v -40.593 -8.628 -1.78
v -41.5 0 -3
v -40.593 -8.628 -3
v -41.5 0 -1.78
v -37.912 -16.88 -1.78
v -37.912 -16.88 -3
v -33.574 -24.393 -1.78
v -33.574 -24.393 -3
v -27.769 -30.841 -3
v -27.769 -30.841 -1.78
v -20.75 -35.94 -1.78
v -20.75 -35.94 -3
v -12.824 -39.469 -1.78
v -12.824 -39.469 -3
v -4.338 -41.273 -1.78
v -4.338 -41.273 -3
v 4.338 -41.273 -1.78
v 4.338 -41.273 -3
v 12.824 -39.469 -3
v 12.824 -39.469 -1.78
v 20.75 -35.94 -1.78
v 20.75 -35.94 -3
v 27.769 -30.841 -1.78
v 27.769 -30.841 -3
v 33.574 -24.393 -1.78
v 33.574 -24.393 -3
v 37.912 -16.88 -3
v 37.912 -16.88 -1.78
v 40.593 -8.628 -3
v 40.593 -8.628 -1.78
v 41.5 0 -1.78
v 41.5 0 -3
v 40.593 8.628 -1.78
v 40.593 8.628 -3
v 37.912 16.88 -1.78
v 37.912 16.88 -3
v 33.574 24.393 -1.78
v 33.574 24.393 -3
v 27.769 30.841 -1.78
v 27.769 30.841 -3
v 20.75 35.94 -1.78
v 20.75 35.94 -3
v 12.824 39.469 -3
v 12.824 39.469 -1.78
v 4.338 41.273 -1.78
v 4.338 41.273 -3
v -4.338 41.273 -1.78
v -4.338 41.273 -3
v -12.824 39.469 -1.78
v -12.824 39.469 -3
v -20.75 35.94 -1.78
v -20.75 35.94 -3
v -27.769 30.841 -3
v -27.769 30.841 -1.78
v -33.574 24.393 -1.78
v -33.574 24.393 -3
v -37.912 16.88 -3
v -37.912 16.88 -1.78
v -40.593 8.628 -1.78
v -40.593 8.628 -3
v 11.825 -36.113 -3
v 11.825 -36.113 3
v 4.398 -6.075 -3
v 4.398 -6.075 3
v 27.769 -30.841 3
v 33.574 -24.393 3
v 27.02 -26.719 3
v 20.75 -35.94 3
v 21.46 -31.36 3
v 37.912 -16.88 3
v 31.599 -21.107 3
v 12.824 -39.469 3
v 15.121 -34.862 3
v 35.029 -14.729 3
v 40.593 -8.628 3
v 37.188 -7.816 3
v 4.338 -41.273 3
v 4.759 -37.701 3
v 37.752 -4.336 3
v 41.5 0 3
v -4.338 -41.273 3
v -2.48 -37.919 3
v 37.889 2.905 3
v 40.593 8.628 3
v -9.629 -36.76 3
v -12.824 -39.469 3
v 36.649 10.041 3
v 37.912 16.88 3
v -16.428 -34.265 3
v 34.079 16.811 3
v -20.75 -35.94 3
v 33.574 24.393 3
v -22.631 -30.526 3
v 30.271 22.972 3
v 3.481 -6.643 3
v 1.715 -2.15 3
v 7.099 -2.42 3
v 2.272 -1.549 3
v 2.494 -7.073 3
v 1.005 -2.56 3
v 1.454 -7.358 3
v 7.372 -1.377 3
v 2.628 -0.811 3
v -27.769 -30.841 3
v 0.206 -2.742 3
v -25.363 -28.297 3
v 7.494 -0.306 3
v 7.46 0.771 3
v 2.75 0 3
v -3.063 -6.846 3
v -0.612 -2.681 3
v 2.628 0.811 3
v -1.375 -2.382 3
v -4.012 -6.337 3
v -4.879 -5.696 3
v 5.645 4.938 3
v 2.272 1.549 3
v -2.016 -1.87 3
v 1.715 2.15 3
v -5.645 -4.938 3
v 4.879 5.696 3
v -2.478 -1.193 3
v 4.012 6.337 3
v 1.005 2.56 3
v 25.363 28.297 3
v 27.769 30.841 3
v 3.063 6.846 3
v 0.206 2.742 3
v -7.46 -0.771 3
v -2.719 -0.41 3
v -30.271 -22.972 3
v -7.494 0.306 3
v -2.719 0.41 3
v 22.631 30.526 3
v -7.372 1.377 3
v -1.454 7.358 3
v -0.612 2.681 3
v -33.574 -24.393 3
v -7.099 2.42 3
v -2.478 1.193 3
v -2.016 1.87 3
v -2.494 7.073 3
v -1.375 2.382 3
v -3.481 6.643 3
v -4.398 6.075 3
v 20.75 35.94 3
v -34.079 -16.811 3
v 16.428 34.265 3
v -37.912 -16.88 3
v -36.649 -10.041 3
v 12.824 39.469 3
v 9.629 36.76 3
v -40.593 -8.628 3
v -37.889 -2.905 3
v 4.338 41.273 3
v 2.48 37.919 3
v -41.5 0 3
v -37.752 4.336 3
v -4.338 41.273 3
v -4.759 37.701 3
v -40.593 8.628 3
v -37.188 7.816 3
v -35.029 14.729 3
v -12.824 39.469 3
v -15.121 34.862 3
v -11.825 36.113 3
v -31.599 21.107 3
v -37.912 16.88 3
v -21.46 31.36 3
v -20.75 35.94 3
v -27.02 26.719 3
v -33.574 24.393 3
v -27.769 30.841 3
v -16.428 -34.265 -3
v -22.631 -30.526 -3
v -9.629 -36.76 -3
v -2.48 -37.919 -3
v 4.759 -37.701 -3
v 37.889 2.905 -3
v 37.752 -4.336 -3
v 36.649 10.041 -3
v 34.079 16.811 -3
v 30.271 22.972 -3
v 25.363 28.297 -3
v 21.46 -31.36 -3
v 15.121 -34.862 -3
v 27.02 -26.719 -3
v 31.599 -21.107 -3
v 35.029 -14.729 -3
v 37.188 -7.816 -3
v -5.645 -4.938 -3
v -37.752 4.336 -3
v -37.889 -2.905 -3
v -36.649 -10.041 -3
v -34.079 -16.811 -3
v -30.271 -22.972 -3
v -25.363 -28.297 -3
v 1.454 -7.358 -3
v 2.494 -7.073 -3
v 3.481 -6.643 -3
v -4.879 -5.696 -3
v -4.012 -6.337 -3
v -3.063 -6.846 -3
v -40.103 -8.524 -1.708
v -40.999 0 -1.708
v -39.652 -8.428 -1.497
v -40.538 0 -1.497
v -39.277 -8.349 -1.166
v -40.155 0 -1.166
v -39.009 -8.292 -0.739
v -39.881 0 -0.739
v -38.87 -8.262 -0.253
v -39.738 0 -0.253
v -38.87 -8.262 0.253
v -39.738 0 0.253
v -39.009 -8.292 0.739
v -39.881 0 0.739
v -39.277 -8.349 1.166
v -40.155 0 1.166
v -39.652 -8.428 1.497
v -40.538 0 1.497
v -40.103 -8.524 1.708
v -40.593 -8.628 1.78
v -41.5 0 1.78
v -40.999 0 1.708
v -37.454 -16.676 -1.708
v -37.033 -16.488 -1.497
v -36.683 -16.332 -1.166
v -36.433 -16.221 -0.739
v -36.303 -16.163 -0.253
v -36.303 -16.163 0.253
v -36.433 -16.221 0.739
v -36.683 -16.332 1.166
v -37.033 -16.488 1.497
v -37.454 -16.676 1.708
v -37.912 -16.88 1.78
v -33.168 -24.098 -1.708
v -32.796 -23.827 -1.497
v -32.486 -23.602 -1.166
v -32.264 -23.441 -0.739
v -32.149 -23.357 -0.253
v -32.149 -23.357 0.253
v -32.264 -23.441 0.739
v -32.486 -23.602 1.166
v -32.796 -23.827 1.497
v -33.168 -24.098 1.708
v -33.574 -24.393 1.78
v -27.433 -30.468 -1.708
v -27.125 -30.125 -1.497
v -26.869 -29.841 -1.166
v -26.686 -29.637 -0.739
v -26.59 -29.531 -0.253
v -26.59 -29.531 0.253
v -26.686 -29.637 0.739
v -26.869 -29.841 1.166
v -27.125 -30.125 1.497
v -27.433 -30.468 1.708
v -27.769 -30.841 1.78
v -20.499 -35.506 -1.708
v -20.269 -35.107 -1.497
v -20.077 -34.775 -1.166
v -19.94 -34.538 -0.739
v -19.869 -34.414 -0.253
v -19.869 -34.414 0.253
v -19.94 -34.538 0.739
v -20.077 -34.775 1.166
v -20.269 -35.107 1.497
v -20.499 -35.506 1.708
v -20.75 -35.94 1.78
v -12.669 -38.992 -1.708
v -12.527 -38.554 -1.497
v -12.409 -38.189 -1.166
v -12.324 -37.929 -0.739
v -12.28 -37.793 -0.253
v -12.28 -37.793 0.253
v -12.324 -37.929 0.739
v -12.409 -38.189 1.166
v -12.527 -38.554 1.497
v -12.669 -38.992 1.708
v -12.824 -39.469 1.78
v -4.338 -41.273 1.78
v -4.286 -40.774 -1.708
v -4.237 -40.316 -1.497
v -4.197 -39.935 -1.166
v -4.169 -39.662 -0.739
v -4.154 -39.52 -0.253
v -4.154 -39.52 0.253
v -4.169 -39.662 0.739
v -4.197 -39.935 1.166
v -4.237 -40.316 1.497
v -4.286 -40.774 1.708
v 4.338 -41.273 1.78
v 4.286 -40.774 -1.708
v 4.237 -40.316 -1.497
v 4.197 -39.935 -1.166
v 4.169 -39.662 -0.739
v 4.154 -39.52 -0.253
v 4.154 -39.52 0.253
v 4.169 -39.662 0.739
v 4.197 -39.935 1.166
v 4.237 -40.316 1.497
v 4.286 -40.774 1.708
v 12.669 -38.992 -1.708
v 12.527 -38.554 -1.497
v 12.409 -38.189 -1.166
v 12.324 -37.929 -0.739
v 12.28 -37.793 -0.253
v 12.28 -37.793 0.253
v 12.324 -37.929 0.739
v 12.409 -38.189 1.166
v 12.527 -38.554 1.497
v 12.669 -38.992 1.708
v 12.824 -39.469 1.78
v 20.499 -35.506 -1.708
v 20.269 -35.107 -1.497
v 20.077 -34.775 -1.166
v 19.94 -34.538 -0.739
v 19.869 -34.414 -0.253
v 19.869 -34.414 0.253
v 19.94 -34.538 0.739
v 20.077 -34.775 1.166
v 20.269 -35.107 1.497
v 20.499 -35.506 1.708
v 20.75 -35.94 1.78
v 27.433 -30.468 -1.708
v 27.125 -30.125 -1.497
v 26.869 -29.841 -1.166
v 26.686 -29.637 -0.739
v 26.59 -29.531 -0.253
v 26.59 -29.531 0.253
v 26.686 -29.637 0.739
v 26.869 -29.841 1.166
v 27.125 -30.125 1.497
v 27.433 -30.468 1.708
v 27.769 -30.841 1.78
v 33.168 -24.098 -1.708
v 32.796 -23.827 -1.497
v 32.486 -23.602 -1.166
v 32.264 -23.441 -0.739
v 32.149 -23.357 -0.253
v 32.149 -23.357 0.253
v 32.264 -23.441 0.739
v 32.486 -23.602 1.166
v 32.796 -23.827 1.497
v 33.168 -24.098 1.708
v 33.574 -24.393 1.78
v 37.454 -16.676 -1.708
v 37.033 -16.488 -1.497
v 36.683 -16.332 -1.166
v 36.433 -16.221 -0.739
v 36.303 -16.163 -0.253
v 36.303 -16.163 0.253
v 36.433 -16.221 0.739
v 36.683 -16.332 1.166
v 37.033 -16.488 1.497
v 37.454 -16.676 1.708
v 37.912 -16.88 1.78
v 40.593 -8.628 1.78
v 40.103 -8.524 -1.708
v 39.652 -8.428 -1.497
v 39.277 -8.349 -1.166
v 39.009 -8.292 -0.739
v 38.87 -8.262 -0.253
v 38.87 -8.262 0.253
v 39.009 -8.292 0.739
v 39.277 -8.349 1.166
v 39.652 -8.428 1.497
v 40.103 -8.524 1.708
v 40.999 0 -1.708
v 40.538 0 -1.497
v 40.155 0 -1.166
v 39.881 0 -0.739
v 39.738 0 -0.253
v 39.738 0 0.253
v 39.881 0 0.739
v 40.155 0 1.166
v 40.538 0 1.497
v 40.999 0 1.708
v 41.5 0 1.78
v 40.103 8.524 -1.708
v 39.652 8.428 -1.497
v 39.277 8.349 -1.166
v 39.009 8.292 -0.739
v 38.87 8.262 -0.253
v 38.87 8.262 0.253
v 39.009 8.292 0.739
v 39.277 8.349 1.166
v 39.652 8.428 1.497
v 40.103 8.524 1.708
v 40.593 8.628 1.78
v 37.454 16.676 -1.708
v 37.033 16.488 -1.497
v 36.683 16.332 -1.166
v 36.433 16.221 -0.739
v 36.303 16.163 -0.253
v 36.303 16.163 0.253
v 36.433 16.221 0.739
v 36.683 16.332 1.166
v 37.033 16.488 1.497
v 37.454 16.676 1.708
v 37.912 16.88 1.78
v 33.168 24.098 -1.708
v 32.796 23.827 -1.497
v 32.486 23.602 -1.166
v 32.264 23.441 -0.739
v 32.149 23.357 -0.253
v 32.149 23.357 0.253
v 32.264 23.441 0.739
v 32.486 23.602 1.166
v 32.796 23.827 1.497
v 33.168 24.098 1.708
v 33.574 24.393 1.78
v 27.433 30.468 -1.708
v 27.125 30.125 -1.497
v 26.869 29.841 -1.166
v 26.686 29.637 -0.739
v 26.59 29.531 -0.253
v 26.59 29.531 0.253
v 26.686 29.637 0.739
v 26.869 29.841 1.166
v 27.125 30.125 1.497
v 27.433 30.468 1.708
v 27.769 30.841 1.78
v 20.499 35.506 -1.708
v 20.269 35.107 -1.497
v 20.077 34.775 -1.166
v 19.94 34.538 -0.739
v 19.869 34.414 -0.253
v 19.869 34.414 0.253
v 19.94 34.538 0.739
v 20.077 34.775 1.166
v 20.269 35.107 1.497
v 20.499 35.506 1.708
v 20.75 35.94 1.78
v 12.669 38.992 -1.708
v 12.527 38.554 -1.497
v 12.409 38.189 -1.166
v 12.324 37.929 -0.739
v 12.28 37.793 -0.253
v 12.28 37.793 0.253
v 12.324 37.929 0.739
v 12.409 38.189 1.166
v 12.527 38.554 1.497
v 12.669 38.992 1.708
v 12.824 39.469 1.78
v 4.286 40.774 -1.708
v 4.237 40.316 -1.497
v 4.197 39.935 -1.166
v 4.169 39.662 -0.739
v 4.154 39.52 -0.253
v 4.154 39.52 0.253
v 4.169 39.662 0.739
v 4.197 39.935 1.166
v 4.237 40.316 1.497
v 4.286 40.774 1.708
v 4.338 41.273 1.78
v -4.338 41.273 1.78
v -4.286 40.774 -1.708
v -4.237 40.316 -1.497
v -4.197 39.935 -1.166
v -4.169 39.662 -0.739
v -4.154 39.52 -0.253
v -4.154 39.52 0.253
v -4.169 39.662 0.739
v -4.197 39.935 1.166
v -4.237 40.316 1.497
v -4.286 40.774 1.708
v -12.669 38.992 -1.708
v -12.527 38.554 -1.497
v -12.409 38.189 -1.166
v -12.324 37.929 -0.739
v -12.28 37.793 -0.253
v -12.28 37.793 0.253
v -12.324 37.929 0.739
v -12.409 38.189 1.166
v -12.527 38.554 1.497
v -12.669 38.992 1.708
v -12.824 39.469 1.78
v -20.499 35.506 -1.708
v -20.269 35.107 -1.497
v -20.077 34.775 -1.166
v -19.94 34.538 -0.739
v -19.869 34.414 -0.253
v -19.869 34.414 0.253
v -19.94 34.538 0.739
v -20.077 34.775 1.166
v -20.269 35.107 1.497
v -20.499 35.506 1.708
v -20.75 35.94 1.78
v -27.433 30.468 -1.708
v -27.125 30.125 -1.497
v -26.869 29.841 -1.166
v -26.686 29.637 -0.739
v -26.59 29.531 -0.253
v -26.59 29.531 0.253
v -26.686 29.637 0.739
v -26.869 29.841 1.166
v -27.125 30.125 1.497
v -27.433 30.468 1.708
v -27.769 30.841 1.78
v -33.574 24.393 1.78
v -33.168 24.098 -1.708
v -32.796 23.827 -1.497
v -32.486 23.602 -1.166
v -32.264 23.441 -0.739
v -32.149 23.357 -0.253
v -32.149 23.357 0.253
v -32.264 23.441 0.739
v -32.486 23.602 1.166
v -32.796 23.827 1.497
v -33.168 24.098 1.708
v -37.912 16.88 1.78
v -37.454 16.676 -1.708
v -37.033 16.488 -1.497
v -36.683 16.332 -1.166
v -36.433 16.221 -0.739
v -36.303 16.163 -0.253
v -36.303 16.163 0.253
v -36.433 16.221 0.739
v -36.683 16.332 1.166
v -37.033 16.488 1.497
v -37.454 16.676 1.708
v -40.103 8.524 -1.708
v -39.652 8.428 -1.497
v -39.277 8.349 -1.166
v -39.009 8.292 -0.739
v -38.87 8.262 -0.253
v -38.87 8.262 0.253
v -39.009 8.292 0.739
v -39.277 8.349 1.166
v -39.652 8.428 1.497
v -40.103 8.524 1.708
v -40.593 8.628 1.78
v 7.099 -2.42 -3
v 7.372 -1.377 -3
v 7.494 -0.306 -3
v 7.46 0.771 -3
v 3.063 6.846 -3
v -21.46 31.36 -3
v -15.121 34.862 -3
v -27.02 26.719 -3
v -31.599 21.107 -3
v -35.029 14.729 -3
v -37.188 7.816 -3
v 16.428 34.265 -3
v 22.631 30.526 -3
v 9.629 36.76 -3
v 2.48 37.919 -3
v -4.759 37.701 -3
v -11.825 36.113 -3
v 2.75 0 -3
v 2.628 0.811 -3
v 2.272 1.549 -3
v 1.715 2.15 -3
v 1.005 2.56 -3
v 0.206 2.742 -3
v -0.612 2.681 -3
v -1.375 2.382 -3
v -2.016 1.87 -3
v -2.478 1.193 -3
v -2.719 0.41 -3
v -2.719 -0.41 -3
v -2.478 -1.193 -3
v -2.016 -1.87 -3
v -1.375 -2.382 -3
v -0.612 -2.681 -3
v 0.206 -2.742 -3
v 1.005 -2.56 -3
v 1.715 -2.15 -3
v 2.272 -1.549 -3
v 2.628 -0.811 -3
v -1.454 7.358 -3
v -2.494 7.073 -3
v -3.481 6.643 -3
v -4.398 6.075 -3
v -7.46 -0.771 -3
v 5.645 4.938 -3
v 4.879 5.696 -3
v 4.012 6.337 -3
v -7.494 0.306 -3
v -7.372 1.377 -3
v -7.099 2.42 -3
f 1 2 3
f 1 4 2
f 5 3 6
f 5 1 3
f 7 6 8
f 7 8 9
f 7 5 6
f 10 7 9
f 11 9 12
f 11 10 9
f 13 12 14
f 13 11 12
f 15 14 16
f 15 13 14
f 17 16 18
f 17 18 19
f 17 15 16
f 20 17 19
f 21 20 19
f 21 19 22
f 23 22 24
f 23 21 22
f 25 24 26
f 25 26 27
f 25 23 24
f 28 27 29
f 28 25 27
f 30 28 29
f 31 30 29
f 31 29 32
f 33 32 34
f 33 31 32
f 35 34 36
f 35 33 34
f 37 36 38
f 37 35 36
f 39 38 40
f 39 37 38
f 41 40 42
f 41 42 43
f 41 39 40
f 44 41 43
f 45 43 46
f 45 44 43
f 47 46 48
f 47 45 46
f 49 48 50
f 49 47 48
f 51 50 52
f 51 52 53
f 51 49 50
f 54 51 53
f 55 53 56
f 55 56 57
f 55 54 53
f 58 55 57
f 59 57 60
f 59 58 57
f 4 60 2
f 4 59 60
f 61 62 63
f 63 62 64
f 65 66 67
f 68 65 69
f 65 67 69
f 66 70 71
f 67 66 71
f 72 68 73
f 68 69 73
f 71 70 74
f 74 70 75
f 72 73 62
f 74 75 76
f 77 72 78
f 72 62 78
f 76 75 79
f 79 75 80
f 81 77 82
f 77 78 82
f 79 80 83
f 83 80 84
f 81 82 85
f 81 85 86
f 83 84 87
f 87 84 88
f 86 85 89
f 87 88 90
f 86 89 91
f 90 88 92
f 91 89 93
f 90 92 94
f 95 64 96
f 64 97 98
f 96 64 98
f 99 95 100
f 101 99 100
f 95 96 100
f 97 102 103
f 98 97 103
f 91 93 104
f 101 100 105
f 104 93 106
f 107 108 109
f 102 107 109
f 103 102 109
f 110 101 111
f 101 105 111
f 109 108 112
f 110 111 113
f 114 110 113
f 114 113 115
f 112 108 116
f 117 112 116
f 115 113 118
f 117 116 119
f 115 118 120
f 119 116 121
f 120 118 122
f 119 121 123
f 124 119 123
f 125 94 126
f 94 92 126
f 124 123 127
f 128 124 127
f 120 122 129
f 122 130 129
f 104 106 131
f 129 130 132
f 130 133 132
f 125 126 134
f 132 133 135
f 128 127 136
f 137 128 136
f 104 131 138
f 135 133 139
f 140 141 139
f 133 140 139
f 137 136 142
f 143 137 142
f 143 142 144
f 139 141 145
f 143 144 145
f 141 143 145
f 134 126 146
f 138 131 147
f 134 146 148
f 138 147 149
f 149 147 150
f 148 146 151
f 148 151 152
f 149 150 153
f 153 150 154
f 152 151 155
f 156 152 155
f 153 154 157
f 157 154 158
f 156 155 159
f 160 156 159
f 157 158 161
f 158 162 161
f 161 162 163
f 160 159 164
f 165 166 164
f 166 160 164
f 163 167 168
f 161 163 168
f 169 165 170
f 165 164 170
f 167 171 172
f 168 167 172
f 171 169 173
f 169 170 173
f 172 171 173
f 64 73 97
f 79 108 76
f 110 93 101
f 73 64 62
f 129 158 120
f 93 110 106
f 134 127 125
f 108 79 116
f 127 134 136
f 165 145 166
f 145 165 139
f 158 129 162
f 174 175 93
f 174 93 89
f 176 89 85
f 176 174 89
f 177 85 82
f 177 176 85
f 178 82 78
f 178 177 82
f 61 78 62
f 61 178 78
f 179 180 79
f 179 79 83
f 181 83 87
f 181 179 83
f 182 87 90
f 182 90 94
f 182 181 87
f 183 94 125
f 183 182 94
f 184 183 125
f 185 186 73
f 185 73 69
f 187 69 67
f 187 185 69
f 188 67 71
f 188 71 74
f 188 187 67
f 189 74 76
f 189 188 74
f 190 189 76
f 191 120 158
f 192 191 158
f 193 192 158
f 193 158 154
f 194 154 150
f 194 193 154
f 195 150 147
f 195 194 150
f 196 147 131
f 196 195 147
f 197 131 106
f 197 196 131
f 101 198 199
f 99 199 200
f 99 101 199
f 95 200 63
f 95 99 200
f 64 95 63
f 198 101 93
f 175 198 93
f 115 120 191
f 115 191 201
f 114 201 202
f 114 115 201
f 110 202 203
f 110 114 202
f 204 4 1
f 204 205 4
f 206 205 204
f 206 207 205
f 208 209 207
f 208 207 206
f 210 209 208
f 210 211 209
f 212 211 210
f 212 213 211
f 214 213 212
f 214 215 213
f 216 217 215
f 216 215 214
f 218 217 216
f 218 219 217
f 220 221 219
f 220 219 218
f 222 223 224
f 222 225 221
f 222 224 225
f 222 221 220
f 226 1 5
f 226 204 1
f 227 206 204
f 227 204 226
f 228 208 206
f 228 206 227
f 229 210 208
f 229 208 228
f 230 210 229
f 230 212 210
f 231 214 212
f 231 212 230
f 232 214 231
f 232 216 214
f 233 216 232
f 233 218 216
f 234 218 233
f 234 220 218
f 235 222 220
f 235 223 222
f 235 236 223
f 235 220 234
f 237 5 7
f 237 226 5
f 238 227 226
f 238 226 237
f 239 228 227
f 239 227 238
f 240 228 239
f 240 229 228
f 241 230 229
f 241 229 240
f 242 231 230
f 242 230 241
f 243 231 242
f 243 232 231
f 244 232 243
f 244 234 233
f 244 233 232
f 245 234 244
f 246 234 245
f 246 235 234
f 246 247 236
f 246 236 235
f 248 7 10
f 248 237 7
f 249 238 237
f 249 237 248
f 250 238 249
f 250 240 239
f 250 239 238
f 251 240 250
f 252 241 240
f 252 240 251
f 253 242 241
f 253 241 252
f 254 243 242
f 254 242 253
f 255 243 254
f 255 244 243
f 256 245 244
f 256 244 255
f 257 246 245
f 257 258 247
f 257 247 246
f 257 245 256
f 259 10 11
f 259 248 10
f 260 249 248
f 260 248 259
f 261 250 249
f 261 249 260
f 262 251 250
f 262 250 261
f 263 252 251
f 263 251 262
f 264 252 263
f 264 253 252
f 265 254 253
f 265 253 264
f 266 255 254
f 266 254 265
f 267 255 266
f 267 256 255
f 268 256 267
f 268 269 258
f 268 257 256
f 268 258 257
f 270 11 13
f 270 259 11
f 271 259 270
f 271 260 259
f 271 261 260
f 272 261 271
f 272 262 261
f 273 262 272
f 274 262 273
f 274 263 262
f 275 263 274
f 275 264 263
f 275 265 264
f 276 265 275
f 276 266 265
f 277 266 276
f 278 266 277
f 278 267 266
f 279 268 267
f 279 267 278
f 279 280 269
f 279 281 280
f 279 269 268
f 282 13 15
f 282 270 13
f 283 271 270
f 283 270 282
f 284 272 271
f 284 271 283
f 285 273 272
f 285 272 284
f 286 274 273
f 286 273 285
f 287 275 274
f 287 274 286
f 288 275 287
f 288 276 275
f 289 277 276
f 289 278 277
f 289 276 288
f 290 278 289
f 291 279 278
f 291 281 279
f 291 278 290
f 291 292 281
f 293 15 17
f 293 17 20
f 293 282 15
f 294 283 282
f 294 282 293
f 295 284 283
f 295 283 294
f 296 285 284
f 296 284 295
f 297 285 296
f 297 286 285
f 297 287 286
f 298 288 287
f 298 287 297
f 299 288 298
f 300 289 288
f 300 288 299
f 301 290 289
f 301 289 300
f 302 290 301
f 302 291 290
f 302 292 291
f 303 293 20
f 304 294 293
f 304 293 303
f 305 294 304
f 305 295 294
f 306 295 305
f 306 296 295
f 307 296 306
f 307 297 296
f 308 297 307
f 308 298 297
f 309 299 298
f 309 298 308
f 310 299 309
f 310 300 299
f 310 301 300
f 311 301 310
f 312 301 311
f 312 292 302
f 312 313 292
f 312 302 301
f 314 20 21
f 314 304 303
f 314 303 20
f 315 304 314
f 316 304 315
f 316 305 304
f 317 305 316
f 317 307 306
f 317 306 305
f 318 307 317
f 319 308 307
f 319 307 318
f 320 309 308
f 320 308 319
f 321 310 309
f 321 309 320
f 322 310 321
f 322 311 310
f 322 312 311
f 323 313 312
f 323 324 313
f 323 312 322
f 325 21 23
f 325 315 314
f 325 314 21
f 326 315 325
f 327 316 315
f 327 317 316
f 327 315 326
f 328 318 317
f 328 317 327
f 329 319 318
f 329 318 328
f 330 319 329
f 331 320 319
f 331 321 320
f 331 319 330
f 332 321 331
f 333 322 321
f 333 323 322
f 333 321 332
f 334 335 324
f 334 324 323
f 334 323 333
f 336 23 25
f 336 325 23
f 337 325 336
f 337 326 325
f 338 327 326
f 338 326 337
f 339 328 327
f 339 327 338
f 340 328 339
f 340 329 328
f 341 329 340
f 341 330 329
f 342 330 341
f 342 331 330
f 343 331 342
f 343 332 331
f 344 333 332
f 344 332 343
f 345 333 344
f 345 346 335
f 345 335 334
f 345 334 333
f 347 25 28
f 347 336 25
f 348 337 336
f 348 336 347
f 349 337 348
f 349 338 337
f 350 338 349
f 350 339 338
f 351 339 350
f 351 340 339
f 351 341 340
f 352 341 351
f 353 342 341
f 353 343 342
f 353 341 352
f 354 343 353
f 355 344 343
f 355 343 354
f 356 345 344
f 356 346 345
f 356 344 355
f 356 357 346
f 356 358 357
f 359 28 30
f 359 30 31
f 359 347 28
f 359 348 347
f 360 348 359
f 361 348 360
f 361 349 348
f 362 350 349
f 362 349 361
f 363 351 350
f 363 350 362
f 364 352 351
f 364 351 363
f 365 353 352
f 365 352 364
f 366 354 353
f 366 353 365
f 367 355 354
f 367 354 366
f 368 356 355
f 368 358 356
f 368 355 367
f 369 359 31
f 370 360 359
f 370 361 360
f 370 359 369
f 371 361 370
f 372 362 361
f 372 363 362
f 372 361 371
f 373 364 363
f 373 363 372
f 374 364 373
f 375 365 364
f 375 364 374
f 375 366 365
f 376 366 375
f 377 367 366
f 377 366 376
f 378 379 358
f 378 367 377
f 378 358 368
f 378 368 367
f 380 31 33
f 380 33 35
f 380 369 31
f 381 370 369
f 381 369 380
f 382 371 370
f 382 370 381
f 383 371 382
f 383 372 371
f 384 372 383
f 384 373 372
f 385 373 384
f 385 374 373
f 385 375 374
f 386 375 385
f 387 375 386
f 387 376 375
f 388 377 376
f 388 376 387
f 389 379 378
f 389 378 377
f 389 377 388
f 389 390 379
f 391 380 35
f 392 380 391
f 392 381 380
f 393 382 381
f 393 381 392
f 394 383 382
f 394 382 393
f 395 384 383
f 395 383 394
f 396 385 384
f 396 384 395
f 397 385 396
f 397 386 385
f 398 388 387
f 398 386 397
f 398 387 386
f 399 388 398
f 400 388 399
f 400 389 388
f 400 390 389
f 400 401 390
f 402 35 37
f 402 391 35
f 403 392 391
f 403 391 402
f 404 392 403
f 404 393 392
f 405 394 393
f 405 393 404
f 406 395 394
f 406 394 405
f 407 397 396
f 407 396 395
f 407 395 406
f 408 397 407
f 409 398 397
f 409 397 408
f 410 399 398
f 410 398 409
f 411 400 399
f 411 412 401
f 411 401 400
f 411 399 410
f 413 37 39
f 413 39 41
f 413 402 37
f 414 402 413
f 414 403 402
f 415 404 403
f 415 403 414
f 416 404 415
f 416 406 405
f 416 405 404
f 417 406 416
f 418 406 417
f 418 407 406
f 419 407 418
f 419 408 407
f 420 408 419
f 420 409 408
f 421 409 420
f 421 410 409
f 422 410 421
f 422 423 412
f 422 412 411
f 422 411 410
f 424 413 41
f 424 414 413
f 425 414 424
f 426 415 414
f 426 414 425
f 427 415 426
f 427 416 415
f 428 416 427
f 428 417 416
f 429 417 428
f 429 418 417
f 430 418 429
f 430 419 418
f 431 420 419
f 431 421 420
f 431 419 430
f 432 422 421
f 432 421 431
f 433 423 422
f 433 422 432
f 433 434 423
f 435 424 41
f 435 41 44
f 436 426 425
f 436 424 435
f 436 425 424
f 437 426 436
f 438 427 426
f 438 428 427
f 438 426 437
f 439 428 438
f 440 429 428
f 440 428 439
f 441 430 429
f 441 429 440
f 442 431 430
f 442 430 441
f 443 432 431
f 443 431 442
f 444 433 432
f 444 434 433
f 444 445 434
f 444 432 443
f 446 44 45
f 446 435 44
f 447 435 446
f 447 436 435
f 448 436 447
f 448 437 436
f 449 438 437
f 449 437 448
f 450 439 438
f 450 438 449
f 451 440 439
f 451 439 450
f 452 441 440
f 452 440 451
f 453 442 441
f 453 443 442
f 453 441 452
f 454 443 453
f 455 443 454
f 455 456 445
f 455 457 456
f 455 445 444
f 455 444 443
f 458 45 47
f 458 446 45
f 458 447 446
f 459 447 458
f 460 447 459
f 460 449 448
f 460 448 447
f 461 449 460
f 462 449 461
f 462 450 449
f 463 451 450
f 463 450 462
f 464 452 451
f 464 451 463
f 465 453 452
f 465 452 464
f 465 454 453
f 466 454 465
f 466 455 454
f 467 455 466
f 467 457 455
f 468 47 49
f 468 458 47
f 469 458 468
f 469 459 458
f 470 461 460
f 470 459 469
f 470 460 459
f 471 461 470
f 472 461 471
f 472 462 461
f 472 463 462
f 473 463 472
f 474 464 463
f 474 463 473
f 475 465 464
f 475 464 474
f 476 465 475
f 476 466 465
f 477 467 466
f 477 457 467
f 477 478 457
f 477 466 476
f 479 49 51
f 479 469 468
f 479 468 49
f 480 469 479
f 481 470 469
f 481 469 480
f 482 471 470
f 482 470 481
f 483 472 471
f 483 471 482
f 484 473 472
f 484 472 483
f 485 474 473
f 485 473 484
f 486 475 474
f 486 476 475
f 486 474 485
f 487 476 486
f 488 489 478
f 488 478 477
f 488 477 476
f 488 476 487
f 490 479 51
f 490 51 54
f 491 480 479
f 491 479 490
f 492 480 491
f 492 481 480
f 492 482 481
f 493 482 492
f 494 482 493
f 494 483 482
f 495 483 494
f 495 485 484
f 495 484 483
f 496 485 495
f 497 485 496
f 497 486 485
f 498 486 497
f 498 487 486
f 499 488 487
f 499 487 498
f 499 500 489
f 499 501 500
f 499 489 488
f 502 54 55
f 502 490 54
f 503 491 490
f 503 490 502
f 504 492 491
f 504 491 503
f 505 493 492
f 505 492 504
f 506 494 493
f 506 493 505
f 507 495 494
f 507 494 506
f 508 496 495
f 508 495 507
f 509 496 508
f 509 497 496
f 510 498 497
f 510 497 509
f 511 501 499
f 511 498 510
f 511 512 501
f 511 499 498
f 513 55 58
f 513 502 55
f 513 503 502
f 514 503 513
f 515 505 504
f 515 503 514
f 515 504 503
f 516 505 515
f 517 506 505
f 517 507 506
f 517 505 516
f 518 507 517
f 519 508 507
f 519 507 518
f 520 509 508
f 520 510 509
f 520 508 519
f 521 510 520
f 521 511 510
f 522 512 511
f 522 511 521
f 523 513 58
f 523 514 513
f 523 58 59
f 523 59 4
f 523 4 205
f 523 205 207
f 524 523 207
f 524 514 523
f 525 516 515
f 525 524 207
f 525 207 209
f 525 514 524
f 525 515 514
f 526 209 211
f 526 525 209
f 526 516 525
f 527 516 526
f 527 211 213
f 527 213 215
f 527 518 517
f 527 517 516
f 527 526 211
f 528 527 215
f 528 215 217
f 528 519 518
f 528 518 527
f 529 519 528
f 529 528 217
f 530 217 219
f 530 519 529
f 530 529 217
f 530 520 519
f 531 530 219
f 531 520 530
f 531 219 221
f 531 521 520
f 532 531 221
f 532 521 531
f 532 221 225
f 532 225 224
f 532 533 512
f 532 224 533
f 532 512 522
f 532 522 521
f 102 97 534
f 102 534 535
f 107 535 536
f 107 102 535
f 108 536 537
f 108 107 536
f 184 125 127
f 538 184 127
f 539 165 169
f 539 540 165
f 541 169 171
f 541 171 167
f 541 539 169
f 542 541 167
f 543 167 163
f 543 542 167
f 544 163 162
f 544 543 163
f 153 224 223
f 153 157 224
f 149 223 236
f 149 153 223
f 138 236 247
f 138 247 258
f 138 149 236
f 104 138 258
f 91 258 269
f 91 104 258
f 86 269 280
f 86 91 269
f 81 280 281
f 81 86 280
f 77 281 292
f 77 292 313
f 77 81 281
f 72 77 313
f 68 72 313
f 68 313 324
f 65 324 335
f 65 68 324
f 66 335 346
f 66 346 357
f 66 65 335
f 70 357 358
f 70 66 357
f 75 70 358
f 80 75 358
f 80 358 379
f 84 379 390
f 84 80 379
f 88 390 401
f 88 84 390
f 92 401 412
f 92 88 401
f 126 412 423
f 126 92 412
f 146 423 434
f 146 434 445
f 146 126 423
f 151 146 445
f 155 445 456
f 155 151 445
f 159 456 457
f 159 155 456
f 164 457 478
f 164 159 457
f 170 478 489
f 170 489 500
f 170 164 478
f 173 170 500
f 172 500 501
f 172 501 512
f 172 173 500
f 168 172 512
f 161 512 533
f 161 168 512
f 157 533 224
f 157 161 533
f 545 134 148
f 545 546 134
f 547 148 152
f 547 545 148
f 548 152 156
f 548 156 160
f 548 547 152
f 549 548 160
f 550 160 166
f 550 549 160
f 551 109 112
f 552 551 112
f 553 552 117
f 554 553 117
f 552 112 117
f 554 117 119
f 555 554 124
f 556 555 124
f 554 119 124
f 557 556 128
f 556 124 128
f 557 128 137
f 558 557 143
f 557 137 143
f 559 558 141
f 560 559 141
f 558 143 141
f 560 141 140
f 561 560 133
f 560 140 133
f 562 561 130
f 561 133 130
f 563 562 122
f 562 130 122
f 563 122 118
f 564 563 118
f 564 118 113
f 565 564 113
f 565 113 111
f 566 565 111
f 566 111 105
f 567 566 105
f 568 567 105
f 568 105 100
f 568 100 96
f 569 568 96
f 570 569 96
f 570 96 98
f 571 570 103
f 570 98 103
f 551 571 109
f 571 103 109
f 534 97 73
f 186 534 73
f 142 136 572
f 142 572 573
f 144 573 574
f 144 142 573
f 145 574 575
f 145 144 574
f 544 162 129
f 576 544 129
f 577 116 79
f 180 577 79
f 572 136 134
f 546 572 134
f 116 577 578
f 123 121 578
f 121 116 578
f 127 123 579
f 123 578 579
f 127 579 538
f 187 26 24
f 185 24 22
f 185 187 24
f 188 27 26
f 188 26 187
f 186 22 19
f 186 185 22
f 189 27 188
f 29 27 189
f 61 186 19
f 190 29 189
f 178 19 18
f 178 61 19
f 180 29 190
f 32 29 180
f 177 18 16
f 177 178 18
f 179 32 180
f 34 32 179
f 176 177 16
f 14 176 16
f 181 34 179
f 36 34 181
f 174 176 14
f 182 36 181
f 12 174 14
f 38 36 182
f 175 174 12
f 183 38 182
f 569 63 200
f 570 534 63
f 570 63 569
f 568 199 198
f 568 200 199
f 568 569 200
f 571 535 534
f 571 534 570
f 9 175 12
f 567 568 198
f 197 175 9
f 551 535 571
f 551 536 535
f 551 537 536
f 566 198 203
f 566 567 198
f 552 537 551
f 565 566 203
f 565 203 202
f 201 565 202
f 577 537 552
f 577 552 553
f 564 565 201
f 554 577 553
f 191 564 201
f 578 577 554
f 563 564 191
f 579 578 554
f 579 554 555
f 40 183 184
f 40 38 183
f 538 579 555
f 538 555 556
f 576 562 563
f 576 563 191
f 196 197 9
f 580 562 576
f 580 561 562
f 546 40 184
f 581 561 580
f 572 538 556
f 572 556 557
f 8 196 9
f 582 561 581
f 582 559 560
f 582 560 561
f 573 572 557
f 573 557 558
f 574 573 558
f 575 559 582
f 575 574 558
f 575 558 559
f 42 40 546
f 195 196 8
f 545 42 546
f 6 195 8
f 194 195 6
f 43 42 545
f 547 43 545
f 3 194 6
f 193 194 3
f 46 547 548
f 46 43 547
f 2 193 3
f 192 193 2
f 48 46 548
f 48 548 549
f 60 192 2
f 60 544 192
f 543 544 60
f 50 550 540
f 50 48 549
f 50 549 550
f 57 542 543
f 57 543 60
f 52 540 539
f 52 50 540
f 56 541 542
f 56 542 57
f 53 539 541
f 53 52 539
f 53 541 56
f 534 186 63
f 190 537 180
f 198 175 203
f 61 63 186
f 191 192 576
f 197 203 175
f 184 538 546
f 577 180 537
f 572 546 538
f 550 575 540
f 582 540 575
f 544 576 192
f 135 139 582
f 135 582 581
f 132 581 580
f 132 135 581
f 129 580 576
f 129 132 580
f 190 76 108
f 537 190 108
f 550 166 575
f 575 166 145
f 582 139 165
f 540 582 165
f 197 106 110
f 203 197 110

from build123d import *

# Parameters (mm, degrees)
CENTER_REACH             = 60.766
SKETCH3_R                = 7.5
CENTER_DIRECTION_2_REACH = 60.766
SPOKES_DEPTH             = 6
SKETCH5_R                = 2.75
HOLE_DEPTH               = 6


with BuildPart() as part:
    # Sketch2 → rim (revolve)
    with BuildSketch(Plane(origin=(0, 0, 0), x_dir=(1, 0, 0), z_dir=(0, 1, 0)), mode=Mode.PRIVATE) as rim_sk:
        with BuildLine():
            Line((41.5, -1.78), (41.5, -3))
            Line((41.5, -3), (38, -3))
            Line((38, -3), (38, 3))
            Line((38, 3), (41.5, 3))
            Line((41.5, 3), (41.5, 1.78))
            ThreePointArc((41.5, 1.78), (39.72, 0), (41.5, -1.78))
        make_face()
    revolve(rim_sk.sketch.rotate(Axis((0, 0, -19.925351406), (0, 0, 1)), 180), axis=Axis((0, 0, -19.925351406), (0, 0, 1)))


with BuildPart() as body_2:

    # center: up to this face of the body (flat: up to its plane)
    center_end = Plane(part.part.faces().sort_by_distance((40.326202743, 0, 3))[0])
    # Sketch3 → center (new, up to the picked face)
    with BuildSketch(Plane.XY, mode=Mode.PRIVATE) as center_sk1:
        with Locations(Location((0, 0, 0), (0, 0, 180))):
            Circle(SKETCH3_R)
    center_tool1 = split(extrude(center_sk1.sketch, amount=CENTER_REACH, mode=Mode.PRIVATE), bisect_by=center_end, keep=Keep.BOTH, mode=Mode.PRIVATE)
    add(center_tool1.solids().sort_by(Axis((0, 0, 0), (0, 0, 1)))[0])


    # center direction 2: up to this face of the body (flat: up to its plane)
    center_direction_2_end = Plane(part.part.faces().sort_by_distance((39.173797257, 0, -3))[0])
    # Sketch3 → center direction 2 (add, up to the picked face)
    with BuildSketch(Plane.XY, mode=Mode.PRIVATE) as center_direction_2_sk1:
        with Locations(Location((0, 0, 0), (0, 0, 180))):
            Circle(SKETCH3_R)
    center_direction_2_tool1 = split(extrude(center_direction_2_sk1.sketch, amount=-CENTER_DIRECTION_2_REACH, mode=Mode.PRIVATE), bisect_by=center_direction_2_end, keep=Keep.BOTH, mode=Mode.PRIVATE)
    add(center_direction_2_tool1.solids().sort_by(Axis((0, 0, 0), (0, 0, -1)))[0])


with BuildPart() as part_1:
    add(part.part)

    add(body_2.part)  # spokes merges body 2
    # Sketch4 → spokes (add)
    with BuildSketch(Plane.XY.offset(3)):
        Polygon((-1.454089233, 7.35769152), (23.049269408, 30.928550972), (25.47568141, 28.406146406), (3.06273149, 6.846143134), align=None)
        Polygon((5.644903153, 4.938123975), (38.309545548, -4.496977359), (37.338285116, -7.859514077), (7.460299618, 0.770668291), align=None)
        Polygon((7.098992386, -2.419567545), (15.26027614, -35.425528332), (11.862603706, -36.265660483), (4.397568127, -6.075474843), align=None)
        Polygon((1.454089233, -7.35769152), (-23.049269408, -30.928550972), (-25.47568141, -28.406146406), (-3.06273149, -6.846143134), align=None)
        Polygon((-5.644903153, -4.938123975), (-38.309545548, 4.496977359), (-37.338285116, 7.859514077), (-7.460299618, -0.770668291), align=None)
        Polygon((-7.098992386, 2.419567545), (-15.26027614, 35.425528332), (-11.862603706, 36.265660483), (-4.397568127, 6.075474843), align=None)
    extrude(amount=-SPOKES_DEPTH)

    # Sketch5 → hole (cut)
    with BuildSketch(Plane.XY.offset(3)):
        Circle(SKETCH5_R)
    extrude(amount=-HOLE_DEPTH, mode=Mode.SUBTRACT)


solid = part_1.part
